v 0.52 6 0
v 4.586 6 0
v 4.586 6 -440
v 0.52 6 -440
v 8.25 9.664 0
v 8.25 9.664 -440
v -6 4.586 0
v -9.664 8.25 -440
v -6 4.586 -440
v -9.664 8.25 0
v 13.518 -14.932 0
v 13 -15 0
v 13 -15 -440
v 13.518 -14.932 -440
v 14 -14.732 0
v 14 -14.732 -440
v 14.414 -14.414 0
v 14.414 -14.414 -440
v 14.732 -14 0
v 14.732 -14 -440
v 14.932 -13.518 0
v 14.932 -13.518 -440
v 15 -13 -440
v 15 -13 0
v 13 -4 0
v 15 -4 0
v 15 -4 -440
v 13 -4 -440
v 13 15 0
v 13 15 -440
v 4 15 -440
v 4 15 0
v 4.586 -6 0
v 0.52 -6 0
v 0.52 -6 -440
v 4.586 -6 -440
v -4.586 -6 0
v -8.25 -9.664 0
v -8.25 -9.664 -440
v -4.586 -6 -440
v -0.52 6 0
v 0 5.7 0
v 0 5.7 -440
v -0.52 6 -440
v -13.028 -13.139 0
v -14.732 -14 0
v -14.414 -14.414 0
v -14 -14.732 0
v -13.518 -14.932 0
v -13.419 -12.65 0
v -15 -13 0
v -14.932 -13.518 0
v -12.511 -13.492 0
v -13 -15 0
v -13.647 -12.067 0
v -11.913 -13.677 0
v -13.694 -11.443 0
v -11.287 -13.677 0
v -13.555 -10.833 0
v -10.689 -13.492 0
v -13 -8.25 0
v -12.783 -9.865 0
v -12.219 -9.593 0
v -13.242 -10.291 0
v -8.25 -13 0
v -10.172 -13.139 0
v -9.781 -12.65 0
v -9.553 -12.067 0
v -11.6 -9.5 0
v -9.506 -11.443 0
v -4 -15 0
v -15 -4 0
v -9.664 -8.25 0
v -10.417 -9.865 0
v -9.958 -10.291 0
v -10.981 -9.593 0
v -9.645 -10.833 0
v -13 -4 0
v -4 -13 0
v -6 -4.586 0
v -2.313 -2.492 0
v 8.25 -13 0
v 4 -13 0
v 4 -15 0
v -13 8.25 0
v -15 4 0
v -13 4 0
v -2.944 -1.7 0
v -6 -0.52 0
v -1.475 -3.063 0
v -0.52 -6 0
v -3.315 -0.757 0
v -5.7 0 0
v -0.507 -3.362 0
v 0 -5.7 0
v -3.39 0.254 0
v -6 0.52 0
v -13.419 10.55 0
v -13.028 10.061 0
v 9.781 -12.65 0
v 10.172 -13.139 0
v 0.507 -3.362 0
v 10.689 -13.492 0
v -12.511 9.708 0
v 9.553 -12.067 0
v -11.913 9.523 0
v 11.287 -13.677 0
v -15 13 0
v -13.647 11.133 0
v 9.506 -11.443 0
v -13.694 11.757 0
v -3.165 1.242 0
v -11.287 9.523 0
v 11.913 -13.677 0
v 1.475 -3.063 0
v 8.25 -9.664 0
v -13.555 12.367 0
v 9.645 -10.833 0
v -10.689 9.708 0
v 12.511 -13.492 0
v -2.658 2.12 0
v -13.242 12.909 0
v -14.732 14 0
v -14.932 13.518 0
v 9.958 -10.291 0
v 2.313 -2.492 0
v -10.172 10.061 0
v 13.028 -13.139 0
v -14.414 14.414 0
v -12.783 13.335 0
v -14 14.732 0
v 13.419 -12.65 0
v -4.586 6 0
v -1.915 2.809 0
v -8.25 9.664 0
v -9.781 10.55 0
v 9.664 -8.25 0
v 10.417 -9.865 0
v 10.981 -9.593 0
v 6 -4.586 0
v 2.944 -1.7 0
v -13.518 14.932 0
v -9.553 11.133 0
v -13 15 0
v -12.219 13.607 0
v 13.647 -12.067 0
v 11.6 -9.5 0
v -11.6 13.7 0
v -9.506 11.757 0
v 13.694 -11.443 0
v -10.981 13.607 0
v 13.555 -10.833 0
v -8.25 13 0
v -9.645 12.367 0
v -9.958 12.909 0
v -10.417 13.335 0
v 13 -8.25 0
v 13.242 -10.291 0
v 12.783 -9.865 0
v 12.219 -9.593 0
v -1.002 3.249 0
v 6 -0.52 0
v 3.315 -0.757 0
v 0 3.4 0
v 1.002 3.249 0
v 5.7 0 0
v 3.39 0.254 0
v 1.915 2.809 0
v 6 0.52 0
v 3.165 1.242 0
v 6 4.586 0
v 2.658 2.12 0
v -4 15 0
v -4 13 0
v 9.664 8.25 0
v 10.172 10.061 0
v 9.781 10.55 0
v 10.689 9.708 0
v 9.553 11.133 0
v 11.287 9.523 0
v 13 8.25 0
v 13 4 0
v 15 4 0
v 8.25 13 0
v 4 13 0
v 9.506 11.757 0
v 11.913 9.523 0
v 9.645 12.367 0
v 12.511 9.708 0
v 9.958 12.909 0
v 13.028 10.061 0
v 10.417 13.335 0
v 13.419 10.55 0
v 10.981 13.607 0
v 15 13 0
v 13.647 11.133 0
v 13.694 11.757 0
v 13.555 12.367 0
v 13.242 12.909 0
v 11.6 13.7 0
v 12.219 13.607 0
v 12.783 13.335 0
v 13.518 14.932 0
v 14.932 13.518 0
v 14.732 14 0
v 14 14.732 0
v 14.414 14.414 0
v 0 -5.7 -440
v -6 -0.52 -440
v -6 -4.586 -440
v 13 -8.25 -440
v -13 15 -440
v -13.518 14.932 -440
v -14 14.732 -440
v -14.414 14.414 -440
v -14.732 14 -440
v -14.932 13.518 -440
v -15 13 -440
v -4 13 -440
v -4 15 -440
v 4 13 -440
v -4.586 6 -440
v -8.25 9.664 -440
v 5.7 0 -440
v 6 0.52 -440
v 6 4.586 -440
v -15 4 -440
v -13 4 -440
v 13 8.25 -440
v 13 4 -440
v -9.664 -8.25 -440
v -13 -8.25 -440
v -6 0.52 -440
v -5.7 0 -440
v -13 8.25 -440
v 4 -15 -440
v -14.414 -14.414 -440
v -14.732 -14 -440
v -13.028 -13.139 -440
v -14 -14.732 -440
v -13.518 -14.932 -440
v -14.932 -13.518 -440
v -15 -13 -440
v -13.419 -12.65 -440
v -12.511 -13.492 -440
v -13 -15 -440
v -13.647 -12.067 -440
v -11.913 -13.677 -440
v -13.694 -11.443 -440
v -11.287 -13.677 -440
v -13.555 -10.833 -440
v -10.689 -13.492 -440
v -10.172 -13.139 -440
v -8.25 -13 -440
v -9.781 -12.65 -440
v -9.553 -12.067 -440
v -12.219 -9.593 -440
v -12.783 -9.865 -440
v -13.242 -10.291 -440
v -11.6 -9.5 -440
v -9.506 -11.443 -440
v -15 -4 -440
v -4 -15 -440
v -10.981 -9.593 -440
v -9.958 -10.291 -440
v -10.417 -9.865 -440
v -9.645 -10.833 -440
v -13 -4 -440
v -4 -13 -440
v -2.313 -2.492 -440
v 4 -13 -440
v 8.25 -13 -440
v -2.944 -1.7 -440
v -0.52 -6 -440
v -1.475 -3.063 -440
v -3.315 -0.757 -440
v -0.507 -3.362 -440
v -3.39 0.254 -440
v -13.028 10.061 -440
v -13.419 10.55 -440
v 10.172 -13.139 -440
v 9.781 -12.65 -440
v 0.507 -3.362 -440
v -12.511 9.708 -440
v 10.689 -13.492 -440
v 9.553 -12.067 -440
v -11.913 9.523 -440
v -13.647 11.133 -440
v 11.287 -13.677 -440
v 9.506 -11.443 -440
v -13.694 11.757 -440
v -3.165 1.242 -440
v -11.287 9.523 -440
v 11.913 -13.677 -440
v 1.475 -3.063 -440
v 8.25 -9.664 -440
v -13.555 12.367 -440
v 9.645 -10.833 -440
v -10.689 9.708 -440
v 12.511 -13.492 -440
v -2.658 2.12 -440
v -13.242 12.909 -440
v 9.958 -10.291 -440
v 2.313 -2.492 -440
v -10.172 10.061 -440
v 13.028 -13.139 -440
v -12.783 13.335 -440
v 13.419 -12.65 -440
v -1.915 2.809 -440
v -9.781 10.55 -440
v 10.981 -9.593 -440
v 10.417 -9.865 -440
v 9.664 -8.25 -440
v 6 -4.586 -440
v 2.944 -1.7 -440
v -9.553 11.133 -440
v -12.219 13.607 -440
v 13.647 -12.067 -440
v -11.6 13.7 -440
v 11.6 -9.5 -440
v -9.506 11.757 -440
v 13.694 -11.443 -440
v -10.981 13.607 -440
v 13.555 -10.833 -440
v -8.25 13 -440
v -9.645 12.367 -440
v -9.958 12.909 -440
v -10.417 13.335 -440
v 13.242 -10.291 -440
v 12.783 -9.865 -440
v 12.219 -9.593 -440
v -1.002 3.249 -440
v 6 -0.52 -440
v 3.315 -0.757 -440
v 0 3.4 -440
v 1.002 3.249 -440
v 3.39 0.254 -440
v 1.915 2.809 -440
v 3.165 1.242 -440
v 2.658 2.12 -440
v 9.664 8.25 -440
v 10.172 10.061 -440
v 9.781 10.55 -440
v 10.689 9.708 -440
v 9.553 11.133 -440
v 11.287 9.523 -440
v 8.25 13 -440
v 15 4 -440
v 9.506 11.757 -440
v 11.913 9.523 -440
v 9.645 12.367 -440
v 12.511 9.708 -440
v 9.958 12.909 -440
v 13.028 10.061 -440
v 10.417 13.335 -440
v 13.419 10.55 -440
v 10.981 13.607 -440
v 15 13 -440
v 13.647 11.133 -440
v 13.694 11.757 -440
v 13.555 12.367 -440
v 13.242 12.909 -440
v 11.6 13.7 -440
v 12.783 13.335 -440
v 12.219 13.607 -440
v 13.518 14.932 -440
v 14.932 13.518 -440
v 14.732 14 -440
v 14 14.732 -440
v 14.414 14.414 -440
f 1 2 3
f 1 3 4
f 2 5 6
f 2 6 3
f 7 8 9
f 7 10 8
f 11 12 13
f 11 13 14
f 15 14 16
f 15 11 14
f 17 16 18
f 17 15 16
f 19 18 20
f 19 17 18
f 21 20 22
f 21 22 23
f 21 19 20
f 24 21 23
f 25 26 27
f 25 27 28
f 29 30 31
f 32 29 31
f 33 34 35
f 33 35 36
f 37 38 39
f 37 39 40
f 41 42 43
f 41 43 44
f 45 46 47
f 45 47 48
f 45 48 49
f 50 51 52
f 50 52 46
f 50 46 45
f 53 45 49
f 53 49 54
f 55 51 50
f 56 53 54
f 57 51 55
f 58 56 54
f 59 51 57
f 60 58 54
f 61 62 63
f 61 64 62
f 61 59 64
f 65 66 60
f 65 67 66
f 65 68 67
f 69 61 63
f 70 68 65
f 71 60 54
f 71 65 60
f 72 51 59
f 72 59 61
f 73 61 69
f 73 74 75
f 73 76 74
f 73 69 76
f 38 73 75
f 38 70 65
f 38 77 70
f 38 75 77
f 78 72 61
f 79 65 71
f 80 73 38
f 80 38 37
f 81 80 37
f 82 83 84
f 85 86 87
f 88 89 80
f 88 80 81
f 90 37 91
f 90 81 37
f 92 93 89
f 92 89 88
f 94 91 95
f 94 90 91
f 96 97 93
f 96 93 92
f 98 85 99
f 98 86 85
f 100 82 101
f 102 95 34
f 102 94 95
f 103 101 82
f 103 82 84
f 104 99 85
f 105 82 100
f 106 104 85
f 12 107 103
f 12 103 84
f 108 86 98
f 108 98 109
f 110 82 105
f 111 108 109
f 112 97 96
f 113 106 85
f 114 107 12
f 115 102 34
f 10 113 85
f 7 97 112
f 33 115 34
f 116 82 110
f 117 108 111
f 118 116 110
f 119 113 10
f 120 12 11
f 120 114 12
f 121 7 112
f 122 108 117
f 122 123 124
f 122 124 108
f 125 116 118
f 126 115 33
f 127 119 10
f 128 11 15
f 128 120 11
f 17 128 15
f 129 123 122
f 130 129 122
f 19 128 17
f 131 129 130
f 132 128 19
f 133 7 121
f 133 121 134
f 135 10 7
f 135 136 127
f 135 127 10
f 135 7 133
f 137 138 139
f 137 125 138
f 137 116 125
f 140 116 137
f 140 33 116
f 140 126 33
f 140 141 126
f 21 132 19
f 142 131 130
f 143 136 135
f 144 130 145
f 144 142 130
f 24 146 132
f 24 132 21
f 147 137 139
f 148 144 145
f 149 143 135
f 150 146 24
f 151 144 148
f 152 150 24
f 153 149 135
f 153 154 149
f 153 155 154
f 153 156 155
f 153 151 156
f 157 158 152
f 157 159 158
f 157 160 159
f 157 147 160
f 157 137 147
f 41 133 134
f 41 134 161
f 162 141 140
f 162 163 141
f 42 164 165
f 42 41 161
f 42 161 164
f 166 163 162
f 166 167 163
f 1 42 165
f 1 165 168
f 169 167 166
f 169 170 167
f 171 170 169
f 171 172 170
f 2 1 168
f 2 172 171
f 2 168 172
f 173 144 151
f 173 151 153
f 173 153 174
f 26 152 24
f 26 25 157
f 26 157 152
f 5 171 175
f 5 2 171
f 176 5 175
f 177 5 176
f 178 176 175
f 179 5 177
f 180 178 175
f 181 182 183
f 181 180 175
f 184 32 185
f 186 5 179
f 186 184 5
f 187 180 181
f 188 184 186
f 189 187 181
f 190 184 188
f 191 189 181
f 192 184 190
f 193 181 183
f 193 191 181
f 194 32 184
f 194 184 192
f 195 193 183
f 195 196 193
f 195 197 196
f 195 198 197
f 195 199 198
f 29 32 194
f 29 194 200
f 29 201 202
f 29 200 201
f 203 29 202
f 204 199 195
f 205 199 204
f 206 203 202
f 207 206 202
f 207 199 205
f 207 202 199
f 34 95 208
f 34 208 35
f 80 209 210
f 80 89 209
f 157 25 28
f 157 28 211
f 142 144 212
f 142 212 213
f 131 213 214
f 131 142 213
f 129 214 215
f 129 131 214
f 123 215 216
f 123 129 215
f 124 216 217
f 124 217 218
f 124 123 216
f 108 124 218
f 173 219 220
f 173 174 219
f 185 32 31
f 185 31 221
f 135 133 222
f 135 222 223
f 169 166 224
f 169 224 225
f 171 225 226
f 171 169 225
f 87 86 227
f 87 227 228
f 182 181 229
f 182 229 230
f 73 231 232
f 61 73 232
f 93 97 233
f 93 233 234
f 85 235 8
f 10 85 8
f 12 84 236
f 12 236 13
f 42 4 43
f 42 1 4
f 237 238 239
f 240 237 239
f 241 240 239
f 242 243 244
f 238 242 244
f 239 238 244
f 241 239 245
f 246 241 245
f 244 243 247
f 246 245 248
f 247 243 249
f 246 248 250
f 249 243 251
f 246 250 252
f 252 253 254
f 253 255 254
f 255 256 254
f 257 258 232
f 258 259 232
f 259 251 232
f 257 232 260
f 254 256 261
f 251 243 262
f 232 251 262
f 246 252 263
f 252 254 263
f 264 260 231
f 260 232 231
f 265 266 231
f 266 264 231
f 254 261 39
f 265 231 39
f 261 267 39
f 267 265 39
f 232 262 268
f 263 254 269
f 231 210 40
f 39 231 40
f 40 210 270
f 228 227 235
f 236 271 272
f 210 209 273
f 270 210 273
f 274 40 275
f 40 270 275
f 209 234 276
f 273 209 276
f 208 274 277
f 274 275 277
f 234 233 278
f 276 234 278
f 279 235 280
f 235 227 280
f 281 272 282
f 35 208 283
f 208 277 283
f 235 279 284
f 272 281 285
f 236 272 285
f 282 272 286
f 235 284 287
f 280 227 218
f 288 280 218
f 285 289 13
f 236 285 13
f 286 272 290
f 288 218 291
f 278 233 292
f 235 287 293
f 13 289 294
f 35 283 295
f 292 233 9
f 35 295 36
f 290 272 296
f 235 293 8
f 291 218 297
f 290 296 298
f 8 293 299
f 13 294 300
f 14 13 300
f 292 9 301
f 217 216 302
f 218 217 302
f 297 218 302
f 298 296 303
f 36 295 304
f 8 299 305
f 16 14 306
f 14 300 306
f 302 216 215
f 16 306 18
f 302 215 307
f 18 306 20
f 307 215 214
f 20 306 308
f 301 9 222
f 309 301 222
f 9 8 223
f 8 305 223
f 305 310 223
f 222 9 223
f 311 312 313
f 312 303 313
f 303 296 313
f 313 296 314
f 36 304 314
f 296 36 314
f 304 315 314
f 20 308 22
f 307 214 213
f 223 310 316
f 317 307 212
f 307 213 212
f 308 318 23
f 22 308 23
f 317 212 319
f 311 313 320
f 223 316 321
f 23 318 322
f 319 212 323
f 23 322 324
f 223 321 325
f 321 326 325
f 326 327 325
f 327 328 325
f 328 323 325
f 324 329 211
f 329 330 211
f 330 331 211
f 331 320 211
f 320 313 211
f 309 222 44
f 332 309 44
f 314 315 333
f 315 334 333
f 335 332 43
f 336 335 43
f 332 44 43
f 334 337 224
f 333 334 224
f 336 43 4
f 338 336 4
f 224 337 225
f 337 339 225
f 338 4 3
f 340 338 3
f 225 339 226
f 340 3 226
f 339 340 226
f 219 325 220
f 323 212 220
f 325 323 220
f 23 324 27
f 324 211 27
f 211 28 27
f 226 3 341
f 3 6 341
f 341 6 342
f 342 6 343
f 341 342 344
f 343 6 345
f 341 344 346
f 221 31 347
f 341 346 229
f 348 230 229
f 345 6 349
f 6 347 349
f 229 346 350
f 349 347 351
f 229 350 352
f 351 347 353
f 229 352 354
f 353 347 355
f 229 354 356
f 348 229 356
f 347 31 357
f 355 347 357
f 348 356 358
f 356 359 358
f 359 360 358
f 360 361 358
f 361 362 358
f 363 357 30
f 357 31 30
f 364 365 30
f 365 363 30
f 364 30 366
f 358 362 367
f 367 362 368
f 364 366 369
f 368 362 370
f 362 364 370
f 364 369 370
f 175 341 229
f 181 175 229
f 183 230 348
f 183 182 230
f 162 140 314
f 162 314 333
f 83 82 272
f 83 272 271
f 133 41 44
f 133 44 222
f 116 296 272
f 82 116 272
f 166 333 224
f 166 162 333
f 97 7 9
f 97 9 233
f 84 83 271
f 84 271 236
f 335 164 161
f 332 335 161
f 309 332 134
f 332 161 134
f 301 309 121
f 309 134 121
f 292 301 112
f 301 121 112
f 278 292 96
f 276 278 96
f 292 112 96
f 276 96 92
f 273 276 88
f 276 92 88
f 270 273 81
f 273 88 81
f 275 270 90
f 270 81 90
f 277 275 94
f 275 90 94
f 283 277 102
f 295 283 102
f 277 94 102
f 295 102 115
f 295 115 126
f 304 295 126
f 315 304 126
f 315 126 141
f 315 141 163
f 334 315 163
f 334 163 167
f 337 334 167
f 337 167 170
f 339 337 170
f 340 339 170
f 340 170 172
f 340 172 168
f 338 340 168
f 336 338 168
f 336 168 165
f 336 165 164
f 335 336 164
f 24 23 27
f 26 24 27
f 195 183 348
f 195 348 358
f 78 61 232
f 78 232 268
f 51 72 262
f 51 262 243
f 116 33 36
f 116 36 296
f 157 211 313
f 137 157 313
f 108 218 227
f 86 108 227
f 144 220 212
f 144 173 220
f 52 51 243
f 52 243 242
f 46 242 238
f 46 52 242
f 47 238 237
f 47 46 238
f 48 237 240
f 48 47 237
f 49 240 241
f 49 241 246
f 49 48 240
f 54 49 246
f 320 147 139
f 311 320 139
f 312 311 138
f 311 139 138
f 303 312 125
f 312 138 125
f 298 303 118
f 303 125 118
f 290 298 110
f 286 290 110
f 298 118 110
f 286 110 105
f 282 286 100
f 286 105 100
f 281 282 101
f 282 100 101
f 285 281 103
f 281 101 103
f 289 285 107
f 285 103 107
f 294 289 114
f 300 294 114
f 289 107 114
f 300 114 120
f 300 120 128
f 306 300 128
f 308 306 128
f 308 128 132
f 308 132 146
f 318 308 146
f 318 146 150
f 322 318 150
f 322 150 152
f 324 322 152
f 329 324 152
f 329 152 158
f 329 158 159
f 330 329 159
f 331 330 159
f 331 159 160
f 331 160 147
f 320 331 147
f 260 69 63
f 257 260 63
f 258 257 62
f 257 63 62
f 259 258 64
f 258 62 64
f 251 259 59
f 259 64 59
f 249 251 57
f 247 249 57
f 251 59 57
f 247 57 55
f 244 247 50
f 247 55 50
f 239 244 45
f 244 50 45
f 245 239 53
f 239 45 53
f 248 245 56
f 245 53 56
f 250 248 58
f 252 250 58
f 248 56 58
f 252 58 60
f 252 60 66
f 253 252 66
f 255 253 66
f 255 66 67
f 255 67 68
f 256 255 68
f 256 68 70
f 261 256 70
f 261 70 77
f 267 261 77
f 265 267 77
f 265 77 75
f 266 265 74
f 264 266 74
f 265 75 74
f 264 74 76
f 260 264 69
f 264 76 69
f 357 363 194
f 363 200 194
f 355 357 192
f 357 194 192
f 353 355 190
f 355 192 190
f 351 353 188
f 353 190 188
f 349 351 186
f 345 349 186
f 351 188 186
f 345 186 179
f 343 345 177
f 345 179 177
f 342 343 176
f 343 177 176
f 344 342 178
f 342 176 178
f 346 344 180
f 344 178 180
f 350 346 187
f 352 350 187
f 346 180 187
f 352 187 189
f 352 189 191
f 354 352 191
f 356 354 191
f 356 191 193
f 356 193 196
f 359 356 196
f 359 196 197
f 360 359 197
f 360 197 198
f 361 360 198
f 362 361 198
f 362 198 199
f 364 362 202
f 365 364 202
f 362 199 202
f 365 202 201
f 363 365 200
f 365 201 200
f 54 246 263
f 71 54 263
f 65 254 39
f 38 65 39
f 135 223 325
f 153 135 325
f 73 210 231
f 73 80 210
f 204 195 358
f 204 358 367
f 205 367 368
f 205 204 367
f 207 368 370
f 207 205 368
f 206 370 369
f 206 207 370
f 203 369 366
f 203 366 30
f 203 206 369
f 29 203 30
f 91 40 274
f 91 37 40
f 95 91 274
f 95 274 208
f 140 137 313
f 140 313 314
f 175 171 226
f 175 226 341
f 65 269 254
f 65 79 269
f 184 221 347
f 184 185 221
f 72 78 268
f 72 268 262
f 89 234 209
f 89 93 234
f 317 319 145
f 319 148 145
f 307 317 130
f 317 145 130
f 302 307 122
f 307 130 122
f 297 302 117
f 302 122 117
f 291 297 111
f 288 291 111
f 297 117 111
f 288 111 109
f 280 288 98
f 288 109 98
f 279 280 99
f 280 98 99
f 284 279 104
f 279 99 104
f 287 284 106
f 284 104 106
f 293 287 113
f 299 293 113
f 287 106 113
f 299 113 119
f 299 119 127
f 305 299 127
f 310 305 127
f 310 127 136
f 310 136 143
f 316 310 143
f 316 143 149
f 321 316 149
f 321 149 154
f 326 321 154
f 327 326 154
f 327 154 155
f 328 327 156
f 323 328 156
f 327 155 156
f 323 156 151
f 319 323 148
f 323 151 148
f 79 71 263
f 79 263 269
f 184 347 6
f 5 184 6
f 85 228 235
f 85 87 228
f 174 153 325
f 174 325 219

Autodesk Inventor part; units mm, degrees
sketch "Sketch_1" plane through (0, 0, 0) normal (0, 0, 1) x (1, 0, 0)
  line L0 (-15, -4) -> (-15, -13)
  arc A0 (-15, -13) -> (-13, -15) centre (-13, -13) ccw
  line L1 (-13, -15) -> (-4, -15)
  line L2 (-4, -15) -> (-4, -13)
  line L3 (-4, -13) -> (-8.25, -13)
  line L4 (-8.25, -13) -> (-8.25, -9.6642)
  line L5 (-8.25, -9.6642) -> (-4.5858, -6)
  line L6 (-4.5858, -6) -> (-0.5196, -6)
  line L7 (-0.5196, -6) -> (0, -5.7)
  line L8 (0, -5.7) -> (0.5196, -6)
  line L9 (0.5196, -6) -> (4.5858, -6)
  line L10 (4.5858, -6) -> (8.25, -9.6642)
  line L11 (8.25, -9.6642) -> (8.25, -13)
  line L12 (8.25, -13) -> (4, -13)
  line L13 (4, -13) -> (4, -15)
  line L14 (4, -15) -> (13, -15)
  arc A1 (13, -15) -> (15, -13) centre (13, -13) ccw
  line L15 (15, -13) -> (15, -4)
  line L16 (15, -4) -> (13, -4)
  line L17 (13, -4) -> (13, -8.25)
  line L18 (13, -8.25) -> (9.6642, -8.25)
  line L19 (9.6642, -8.25) -> (6, -4.5858)
  line L20 (6, -4.5858) -> (6, -0.5196)
  line L21 (6, -0.5196) -> (5.7, 0)
  line L22 (5.7, 0) -> (6, 0.5196)
  line L23 (6, 0.5196) -> (6, 4.5858)
  line L24 (6, 4.5858) -> (9.6642, 8.25)
  line L25 (9.6642, 8.25) -> (13, 8.25)
  line L26 (13, 8.25) -> (13, 4)
  line L27 (13, 4) -> (15, 4)
  line L28 (15, 4) -> (15, 13)
  arc A2 (15, 13) -> (13, 15) centre (13, 13) ccw
  line L29 (13, 15) -> (4, 15)
  line L30 (4, 15) -> (4, 13)
  line L31 (4, 13) -> (8.25, 13)
  line L32 (8.25, 13) -> (8.25, 9.6642)
  line L33 (8.25, 9.6642) -> (4.5858, 6)
  line L34 (4.5858, 6) -> (0.5196, 6)
  line L35 (0.5196, 6) -> (0, 5.7)
  line L36 (0, 5.7) -> (-0.5196, 6)
  line L37 (-0.5196, 6) -> (-4.5858, 6)
  line L38 (-4.5858, 6) -> (-8.25, 9.6642)
  line L39 (-8.25, 9.6642) -> (-8.25, 13)
  line L40 (-8.25, 13) -> (-4, 13)
  line L41 (-4, 13) -> (-4, 15)
  line L42 (-4, 15) -> (-13, 15)
  arc A3 (-13, 15) -> (-15, 13) centre (-13, 13) ccw
  line L43 (-15, 13) -> (-15, 4)
  line L44 (-15, 4) -> (-13, 4)
  line L45 (-13, 4) -> (-13, 8.25)
  line L46 (-13, 8.25) -> (-9.6642, 8.25)
  line L47 (-9.6642, 8.25) -> (-6, 4.5858)
  line L48 (-6, 4.5858) -> (-6, 0.5196)
  line L49 (-6, 0.5196) -> (-5.7, 0)
  line L50 (-5.7, 0) -> (-6, -0.5196)
  line L51 (-6, -0.5196) -> (-6, -4.5858)
  line L52 (-6, -4.5858) -> (-9.6642, -8.25)
  line L53 (-9.6642, -8.25) -> (-13, -8.25)
  line L54 (-13, -8.25) -> (-13, -4)
  line L55 (-13, -4) -> (-15, -4)
extrude "Extrusion1" add sketch "Sketch_1" against normal blind 440
sketch "Sketch2" plane through (0, 0, -440) normal (0, 0, -1) x (-1, 0, 0)
  point P0 (0, 0)
hole "Hole1" at (0, 0, -440) direction (0, 0, 1) diameter 6.8 depth 440
sketch "Sketch3" plane through (0, 0, -440) normal (0, 0, -1) x (-1, 0, 0)
  point P0 (-11.6, 11.6)
hole "Hole2" at (11.6, 11.6, -440) direction (0, 0, 1) diameter 4.2 depth 440
pattern_linear "Rectangular Pattern1" count 2 spacing 23.2 along (-1, 0, 0) count 2 spacing 23.2 along (0, -1, 0) of "Hole2"
ref_plane "C1_XY" through (0, 0, 0) normal (0, 0, 1) x (1, 0, 0)
ref_plane "C1_YZ" through (0, 0, 0) normal (1, 0, 0) x (0, 1, 0)
ref_plane "C1_ZX" through (0, 0, 0) normal (0, 1, 0) x (0, 0, 1)
ref_plane "to_frame_cap1_XY" through (0, 0, 0) normal (0, 0, 1) x (1, 0, 0)
ref_plane "to_frame_cap1_YZ" through (0, 0, 0) normal (1, 0, 0) x (0, 1, 0)
ref_plane "to_frame_cap1_ZX" through (0, 0, 0) normal (0, 1, 0) x (0, 0, 1)
ref_plane "to_frame_cap2_XY" through (0, 0, -440) normal (0, 0, -1) x (1, 0, 0)
ref_plane "to_frame_cap2_YZ" through (0, 0, -440) normal (1, 0, 0) x (0, -1, 0)
ref_plane "to_frame_cap2_ZX" through (0, 0, -440) normal (0, -1, 0) x (0, 0, -1)
properties part number "HFS6-3030-440"
